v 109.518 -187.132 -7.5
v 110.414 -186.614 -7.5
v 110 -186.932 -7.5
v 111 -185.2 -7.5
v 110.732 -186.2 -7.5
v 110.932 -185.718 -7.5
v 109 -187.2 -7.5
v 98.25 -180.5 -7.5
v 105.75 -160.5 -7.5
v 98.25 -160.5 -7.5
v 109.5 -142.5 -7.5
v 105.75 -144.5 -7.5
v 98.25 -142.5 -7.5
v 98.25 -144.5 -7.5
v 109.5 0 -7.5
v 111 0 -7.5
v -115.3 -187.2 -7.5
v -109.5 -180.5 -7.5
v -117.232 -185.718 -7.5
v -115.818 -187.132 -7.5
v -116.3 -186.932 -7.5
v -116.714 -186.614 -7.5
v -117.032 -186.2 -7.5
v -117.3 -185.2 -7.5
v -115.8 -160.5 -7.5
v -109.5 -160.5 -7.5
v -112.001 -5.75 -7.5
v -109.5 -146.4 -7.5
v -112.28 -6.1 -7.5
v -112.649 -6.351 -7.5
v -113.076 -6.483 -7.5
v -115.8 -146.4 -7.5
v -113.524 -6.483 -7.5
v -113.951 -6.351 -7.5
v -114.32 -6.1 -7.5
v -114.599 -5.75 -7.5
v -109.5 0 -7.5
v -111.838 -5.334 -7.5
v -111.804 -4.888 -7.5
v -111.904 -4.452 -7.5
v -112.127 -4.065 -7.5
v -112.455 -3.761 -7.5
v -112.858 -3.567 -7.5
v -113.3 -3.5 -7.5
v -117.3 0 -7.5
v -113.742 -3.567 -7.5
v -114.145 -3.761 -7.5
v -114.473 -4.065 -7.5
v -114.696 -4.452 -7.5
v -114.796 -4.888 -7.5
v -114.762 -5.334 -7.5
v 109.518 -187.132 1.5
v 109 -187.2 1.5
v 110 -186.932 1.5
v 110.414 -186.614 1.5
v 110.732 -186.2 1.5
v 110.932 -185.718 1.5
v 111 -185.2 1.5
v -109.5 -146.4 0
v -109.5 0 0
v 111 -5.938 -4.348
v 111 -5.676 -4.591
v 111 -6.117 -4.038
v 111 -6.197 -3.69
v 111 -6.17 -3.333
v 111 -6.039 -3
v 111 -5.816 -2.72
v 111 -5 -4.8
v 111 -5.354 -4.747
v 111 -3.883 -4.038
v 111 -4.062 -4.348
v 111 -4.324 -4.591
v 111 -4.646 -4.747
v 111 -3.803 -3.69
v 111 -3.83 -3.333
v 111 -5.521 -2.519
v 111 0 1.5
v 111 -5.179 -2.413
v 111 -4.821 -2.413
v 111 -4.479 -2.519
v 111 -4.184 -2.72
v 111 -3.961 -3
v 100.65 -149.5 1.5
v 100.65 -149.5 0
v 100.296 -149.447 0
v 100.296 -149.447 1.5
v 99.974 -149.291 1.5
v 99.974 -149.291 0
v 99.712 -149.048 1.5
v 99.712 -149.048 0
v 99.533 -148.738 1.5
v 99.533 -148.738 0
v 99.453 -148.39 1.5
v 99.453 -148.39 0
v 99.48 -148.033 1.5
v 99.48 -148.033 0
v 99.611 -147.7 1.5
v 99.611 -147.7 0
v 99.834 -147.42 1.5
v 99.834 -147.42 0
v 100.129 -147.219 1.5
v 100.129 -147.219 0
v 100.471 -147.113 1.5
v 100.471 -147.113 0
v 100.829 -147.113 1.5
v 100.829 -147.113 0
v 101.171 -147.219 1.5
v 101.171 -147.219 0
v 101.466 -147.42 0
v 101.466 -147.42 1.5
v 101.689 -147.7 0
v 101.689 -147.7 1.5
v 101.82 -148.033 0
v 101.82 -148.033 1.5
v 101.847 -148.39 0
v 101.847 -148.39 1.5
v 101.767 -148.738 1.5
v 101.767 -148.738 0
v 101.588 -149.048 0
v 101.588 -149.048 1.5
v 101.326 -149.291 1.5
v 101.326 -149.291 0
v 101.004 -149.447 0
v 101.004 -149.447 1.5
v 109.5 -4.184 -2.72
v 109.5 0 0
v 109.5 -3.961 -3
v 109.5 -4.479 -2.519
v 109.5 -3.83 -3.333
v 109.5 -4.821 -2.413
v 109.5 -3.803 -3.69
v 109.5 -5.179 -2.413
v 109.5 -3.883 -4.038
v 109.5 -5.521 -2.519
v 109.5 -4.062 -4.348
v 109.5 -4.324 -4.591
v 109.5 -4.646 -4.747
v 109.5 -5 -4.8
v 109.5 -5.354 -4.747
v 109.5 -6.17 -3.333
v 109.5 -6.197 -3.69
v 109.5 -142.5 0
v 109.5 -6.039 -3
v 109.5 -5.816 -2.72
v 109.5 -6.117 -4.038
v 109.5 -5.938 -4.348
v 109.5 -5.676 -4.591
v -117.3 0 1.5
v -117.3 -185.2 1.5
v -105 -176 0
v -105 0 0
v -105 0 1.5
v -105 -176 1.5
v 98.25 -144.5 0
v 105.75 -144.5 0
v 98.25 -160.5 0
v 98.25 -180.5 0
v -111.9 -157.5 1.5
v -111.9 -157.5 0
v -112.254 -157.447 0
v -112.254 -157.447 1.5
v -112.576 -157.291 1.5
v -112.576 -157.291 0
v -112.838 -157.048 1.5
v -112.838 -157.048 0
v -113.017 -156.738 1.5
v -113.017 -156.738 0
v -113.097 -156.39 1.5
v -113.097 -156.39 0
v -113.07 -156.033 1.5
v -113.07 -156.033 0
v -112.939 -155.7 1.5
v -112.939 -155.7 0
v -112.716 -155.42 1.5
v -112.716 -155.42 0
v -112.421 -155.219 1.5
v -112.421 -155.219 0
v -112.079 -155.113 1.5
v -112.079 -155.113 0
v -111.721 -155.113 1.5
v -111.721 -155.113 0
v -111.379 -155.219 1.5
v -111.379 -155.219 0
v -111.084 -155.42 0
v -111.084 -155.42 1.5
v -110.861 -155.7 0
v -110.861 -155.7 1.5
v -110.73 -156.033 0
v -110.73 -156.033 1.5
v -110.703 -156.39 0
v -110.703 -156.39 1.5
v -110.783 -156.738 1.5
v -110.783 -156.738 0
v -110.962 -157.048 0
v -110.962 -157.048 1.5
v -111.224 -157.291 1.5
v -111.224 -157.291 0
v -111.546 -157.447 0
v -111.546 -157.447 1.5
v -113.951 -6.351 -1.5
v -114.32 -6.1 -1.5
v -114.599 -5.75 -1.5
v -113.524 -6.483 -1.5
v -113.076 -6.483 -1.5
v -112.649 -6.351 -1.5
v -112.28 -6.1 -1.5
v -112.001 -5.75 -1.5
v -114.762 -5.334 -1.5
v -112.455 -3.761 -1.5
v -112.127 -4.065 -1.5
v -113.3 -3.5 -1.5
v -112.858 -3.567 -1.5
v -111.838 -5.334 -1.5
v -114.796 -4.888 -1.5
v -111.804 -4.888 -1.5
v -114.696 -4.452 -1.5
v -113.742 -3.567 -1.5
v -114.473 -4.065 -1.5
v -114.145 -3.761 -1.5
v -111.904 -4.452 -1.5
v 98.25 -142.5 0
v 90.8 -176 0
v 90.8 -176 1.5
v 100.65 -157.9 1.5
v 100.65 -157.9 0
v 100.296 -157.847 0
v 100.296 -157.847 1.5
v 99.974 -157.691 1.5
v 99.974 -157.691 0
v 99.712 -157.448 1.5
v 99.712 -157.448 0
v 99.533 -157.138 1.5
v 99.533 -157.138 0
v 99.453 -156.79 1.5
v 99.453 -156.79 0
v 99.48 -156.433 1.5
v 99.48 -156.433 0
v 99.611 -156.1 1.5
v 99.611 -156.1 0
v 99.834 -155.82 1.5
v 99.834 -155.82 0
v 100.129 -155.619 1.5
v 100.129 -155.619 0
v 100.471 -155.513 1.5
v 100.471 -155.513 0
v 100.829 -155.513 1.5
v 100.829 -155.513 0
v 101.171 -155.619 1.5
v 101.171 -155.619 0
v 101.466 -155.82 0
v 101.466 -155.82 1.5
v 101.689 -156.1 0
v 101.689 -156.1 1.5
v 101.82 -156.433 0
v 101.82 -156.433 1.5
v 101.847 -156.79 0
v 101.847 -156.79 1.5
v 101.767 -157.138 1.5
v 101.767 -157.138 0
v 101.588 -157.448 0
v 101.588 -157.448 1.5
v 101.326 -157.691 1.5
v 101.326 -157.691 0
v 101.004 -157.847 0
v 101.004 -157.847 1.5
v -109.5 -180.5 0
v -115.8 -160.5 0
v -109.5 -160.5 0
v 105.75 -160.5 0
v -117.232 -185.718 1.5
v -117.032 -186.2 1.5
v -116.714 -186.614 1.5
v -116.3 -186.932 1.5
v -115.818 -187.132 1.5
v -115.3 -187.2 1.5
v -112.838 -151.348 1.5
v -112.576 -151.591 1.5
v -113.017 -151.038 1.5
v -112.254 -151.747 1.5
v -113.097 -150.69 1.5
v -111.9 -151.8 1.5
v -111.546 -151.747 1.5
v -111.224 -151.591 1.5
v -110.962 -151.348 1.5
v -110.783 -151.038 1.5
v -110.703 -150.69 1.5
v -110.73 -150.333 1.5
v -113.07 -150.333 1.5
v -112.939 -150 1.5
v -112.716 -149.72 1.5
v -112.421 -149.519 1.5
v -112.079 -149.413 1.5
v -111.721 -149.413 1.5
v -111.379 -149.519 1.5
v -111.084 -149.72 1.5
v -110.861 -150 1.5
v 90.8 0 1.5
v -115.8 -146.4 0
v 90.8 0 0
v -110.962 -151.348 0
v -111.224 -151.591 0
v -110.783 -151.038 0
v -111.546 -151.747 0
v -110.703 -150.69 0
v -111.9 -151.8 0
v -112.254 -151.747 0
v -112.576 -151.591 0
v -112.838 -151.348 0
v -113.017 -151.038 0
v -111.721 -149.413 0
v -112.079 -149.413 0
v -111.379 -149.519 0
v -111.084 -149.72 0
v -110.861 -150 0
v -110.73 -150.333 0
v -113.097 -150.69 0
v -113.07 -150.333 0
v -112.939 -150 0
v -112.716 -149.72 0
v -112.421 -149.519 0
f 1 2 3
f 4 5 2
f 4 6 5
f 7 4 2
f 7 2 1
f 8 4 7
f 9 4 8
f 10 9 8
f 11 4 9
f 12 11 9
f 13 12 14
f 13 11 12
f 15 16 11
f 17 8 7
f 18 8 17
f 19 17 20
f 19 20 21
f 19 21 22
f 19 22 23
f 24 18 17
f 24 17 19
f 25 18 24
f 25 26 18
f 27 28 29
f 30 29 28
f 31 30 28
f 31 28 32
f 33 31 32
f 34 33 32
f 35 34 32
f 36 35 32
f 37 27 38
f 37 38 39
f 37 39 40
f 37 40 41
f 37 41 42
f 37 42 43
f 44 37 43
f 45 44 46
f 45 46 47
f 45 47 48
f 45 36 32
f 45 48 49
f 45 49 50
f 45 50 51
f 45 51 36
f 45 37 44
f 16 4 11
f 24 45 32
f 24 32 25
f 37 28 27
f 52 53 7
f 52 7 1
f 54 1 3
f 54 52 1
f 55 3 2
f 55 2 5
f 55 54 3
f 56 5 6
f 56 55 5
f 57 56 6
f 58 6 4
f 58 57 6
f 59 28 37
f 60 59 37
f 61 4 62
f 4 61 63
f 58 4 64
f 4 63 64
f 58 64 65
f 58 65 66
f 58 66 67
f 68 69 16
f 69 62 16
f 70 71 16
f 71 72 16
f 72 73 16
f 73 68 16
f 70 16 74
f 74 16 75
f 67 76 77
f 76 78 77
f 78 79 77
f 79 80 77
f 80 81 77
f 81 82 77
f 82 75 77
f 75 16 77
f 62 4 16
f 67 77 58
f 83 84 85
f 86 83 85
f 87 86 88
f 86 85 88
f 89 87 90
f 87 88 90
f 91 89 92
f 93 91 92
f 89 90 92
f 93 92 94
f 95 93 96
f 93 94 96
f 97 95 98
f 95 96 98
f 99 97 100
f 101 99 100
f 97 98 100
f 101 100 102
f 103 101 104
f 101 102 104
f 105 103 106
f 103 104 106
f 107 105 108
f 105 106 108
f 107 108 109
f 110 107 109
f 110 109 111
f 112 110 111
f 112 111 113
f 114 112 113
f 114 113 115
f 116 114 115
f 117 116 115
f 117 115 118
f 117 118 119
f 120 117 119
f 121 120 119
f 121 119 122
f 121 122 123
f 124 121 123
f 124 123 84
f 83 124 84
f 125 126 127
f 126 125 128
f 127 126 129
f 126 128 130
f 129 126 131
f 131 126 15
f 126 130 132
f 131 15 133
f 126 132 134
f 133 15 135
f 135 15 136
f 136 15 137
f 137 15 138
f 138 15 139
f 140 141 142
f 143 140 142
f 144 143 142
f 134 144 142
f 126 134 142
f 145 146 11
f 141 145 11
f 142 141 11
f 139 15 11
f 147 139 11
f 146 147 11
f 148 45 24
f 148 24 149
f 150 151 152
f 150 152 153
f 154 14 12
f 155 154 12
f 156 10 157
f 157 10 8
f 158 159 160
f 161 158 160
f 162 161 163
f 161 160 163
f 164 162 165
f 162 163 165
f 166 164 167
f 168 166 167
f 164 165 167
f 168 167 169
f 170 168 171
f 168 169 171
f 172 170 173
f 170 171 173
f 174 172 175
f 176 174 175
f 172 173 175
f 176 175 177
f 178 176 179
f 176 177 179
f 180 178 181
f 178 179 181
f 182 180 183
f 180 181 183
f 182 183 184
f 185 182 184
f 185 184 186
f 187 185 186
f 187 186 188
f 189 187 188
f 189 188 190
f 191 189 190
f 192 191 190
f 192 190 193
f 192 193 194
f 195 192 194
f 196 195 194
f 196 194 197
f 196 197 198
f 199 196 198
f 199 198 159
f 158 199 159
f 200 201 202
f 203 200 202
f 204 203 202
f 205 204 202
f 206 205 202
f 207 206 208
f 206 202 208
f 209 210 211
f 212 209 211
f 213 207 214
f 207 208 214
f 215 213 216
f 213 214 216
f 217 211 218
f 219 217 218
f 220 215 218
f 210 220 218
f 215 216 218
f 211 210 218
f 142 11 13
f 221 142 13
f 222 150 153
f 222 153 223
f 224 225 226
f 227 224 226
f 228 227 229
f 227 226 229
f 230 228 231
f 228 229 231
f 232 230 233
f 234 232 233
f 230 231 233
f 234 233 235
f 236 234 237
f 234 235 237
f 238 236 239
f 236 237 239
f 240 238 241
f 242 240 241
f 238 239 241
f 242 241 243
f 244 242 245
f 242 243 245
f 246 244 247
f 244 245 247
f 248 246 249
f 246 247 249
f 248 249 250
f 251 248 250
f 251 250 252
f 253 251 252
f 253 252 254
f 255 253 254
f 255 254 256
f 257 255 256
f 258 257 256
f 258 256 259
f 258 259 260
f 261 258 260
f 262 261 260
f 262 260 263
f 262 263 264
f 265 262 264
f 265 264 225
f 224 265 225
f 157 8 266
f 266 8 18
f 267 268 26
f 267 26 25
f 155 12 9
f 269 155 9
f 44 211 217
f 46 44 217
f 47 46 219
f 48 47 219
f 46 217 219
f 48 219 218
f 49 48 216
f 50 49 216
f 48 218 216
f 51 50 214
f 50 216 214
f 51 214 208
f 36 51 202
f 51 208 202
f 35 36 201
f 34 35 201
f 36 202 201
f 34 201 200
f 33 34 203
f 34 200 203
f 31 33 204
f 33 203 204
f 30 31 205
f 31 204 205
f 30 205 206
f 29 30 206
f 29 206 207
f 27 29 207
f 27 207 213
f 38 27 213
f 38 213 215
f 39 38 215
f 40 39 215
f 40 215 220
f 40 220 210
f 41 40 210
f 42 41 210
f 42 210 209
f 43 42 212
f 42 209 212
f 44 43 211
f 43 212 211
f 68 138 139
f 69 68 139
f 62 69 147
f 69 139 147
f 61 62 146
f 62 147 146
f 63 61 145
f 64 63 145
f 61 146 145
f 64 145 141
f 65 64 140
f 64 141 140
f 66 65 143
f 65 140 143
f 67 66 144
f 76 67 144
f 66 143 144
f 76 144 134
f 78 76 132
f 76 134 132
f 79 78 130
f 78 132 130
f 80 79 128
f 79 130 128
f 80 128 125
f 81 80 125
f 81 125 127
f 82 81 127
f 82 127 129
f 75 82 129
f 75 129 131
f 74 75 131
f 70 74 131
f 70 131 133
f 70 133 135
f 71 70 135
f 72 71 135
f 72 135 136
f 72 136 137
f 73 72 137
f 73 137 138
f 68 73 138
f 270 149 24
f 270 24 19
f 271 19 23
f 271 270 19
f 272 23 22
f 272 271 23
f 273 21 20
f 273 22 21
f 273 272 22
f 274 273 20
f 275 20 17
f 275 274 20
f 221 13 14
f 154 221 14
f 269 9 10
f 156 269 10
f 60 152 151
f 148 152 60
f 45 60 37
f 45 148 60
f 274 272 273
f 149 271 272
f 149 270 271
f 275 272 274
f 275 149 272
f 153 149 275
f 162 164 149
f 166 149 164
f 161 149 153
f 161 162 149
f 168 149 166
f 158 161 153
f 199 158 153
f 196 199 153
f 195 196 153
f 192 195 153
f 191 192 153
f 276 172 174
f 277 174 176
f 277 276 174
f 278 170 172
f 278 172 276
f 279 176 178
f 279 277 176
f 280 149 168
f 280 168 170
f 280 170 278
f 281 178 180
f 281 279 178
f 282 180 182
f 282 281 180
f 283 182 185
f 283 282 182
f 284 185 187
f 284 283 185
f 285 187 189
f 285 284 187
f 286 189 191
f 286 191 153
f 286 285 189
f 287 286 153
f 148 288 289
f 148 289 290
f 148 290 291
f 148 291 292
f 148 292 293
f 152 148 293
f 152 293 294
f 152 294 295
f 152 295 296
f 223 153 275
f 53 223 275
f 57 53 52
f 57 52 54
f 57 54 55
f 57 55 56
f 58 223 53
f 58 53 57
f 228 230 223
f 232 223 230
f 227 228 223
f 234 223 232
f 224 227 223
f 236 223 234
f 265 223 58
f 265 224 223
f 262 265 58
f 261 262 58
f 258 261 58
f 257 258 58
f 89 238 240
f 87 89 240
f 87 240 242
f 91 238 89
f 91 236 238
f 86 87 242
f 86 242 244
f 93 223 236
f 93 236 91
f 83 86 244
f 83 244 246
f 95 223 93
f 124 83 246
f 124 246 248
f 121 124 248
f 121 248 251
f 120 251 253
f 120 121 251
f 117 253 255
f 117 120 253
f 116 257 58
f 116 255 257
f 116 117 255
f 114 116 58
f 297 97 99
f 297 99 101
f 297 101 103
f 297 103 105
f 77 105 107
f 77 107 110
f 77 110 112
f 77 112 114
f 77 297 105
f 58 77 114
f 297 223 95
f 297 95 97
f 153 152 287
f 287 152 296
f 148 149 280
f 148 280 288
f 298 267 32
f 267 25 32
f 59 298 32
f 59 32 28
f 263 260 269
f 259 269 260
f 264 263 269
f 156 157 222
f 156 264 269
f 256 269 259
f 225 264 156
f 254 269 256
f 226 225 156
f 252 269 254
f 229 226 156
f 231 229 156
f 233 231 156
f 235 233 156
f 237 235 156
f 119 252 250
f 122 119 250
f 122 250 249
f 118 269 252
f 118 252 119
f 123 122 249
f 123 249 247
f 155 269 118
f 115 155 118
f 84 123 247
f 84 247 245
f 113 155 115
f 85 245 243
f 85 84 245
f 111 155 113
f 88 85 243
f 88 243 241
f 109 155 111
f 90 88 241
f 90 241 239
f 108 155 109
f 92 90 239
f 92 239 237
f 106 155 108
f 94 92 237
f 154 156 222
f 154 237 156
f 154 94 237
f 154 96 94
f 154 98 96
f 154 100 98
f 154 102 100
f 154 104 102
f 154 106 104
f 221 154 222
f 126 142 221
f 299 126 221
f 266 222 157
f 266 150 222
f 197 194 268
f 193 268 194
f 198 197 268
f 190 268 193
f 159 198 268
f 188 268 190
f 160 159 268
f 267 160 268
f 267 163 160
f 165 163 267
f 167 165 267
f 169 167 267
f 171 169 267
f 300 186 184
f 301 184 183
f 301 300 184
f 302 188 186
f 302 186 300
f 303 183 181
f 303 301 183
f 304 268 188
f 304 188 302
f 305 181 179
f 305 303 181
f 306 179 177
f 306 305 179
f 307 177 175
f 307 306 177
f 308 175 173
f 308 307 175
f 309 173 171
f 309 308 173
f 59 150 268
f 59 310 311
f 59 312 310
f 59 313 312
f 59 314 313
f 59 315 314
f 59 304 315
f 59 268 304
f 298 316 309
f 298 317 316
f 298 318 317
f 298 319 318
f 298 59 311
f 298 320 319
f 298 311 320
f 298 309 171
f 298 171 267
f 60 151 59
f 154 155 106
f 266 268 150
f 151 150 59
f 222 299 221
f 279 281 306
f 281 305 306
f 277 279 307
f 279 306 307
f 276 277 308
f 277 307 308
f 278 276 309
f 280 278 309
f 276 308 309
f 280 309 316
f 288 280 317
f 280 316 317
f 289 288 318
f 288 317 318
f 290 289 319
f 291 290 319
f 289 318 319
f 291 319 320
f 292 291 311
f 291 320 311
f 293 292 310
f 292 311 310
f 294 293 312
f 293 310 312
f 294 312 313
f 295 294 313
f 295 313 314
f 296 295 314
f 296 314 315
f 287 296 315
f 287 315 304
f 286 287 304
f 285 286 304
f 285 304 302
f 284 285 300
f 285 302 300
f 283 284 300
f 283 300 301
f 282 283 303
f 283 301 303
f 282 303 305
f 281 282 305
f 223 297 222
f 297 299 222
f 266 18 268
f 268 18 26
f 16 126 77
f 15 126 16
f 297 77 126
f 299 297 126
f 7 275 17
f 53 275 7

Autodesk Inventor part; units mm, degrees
ref_plane "YZ Plane" through (0, 0, 0) normal (1, 0, 0) x (0, 1, 0)
ref_plane "XZ Plane" through (0, 0, 0) normal (0, 1, 0) x (-1, 0, 0)
ref_plane "XY Plane" through (0, 0, 0) normal (0, 0, 1) x (1, 0, 0)
sketch "Boceto1" plane through (0, 0, 0) normal (0, 0, 1) x (1, 0, 0)
  circle A0 centre (100.65, -156.7) radius 1.65 projected
  circle A1 centre (100.65, -148.3) radius 1.65 projected
  circle A2 centre (100.65, 156.7) radius 1.65 projected
  circle A3 centre (100.65, 148.3) radius 1.65 projected
  line L0 (97.75, 145) -> (105.25, 145) projected
  line L1 (105.25, 145) -> (105.25, 160) projected
  line L2 (105.25, 160) -> (97.75, 160) projected
  line L3 (97.75, 160) -> (97.75, 180) projected
  line L4 (97.75, 180) -> (-109, 180) projected
  line L5 (-109, 160) -> (-115.3, 160) projected
  line L6 (-109, -160) -> (-109, -180) projected
  line L7 (-115.3, 146.9) -> (-109, 146.9) projected
  line L8 (-109, -146.9) -> (-115.3, -146.9) projected
  line L9 (-109, 180) -> (-109, 160) projected
  line L10 (-115.3, -160) -> (-109, -160) projected
  line L11 (-109, -180) -> (97.75, -180) projected
  line L12 (97.75, -180) -> (97.75, -160) projected
  line L13 (97.75, -160) -> (105.25, -160) projected
  line L14 (105.25, -160) -> (105.25, -145) projected
  line L15 (105.25, -145) -> (97.75, -145) projected
  line L16 (97.75, -145) -> (97.75, -142) projected
  line L17 (97.75, -142) -> (109, -142) projected
  line L18 (109, -142) -> (109, 142) projected
  line L19 (109, 142) -> (97.75, 142) projected
  line L20 (97.75, 142) -> (97.75, 145) projected
  line L21 (109, 180) -> (97.75, 180)
  line L22 (-109, -160) -> (-109, -180)
  line L23 (-109, -180) -> (-102.7, -180)
  line L24 (-109, -180) -> (109, -180)
  line L25 (109, -180) -> (109, 180)
  line L26 (109, 180) -> (-109, 180)
  line L27 (111, 142) -> (111, 180)
  line L28 (109, 182) -> (97.75, 182)
  line L29 (-109, -182) -> (-102.7, -182)
  line L30 (-111, -182) -> (111, -182)
  line L31 (111, -182) -> (111, 182)
  line L32 (111, 182) -> (-111, 182)
  circle A4 centre (-111.9, -156.3) radius 1.2 projected
  circle A5 centre (-111.9, -150.6) radius 1.2 projected
  circle A6 centre (-111.9, 156.3) radius 1.2 projected
  circle A7 centre (-111.9, 150.6) radius 1.2 projected
  line L33 (-115.3, 160) -> (-115.3, 146.9) projected
  line L34 (-109, 146.9) -> (-109, -146.9) projected
  line L35 (-115.3, -146.9) -> (-115.3, -160) projected
  line L36 (-109, 180) -> (-115.3, 180)
  line L37 (-109, -180) -> (-115.3, -180)
  line L38 (-115.3, 180) -> (109, 180)
  line L39 (109, 180) -> (109, -180)
  line L40 (109, -180) -> (-115.3, -180)
  line L41 (-115.3, -180) -> (-115.3, 180)
  line L42 (-117.3, 180) -> (-117.3, -182)
  line L43 (-117.3, -182) -> (109, -182)
  line L44 (-115.3, 182) -> (111, 182)
  line L45 (111, 182) -> (111, -180)
  line L46 (-117.3, 180) -> (-117.3, 182)
  line L47 (-117.3, 182) -> (-115.3, 182)
  point P0 (0, 0)
  dimension "d1" = 2
  dimension "d3" = 2
  dimension "d20" = 2
  dimension "d21" = 2
extrude "Extrusión1" add sketch "Boceto1" against normal blind 7.5 contours L0 L1 L2 L3 L21 L25 L19 L20 | L25 L24 L12 L13 L14 L15 L16 L17 | L9 L5 L41 L36 | L37 L41 L10 L6 | L7 L34 L8 L41 | L31 L30 L29 L43 L42 L46 L47 L44 L32 L28 L27
sketch "Boceto2" plane through (0, 0, 0) normal (0, 0, 1) x (1, 0, 0)
  line L0 (-117.3, -182) -> (111, -182) projected
  line L1 (111, -182) -> (111, 182) projected
  line L2 (111, 182) -> (-117.3, 182) projected
  line L3 (90.8, 170.8) -> (90.8, -176) projected
  line L4 (90.8, 170.8) -> (90.8, -176) projected
  line L5 (-19.4789, -176) -> (90.8, -176) projected
  line L6 (90.8, -176) -> (-99.7, -176) projected
  line L7 (-99.7, -176) -> (-99.7, 170.8) projected
  line L8 (-99.7, 170.8) -> (90.8, 170.8) projected
  line L9 (-117.3, 182) -> (-117.3, -182) projected
  line L10 (-105.5008, -176) -> (-99.7, -176)
  line L11 (-99.7, 170.8) -> (-105.5008, 170.8)
  line L12 (-109, 160) -> (-109, 180) projected
  line L13 (-109, 170.8) -> (-105, 170.8)
  line L14 (-105, 170.8) -> (-105, -176)
  point P0 (0, 0)
  dimension "d33" = 4
extrude "Extrusión2" add sketch "Boceto2" along normal blind 1.5
sketch "Boceto3" plane through (-111, -182, -7.5) normal (0, -1, 0) x (1, 0, 0)
  line L0 (222, 0) -> (-6.3, 0) projected
  line L1 (222, 0) -> (222, 9) projected
  line L2 (-6.3, 9) -> (222, 9) projected
  line L3 (-6.3, 0) -> (-6.3, 9) projected
  point P0 (111, 7.5)
extrude "Extrusión3" add sketch "Boceto3" along normal blind 5.2
sketch "Boceto5" plane through (0, 0, 1.5) normal (0, 0, 1) x (1, 0, 0)
  circle A0 centre (100.65, -156.7) radius 1.65 projected
  circle A1 centre (100.65, -148.3) radius 1.65 projected
  circle A2 centre (100.65, 156.7) radius 1.65 projected
  circle A3 centre (100.65, 148.3) radius 1.65 projected
  line L0 (97.75, 145) -> (105.25, 145) projected
  line L1 (105.25, 145) -> (105.25, 160) projected
  line L2 (105.25, 160) -> (97.75, 160) projected
  line L3 (97.75, 160) -> (97.75, 180) projected
  line L4 (97.75, 180) -> (-109, 180) projected
  line L5 (-109, 160) -> (-115.3, 160) projected
  line L6 (-109, -160) -> (-109, -180) projected
  line L7 (-115.3, 146.9) -> (-109, 146.9) projected
  line L8 (-109, -146.9) -> (-115.3, -146.9) projected
  line L9 (-109, 180) -> (-109, 160) projected
  line L10 (-115.3, -160) -> (-109, -160) projected
  line L11 (-109, -180) -> (97.75, -180) projected
  line L12 (97.75, -180) -> (97.75, -160) projected
  line L13 (97.75, -160) -> (105.25, -160) projected
  line L14 (105.25, -160) -> (105.25, -145) projected
  line L15 (105.25, -145) -> (97.75, -145) projected
  line L16 (97.75, -145) -> (97.75, -142) projected
  line L17 (97.75, -142) -> (109, -142) projected
  line L18 (109, -142) -> (109, 142) projected
  line L19 (109, 142) -> (97.75, 142) projected
  line L20 (97.75, 142) -> (97.75, 145) projected
  circle A4 centre (-111.9, -156.3) radius 1.2 projected
  circle A5 centre (-111.9, -150.6) radius 1.2 projected
  circle A6 centre (-111.9, 156.3) radius 1.2 projected
  circle A7 centre (-111.9, 150.6) radius 1.2 projected
  line L21 (-115.3, 160) -> (-115.3, 146.9) projected
  line L22 (-109, 146.9) -> (-109, -146.9) projected
  line L23 (-115.3, -146.9) -> (-115.3, -160) projected
  point P0 (0, 0)
hole "Agujero1" at (100.65, 148.3, 1.5) at (100.65, 156.7, 1.5) at (100.65, -156.7, 1.5) at (100.65, -148.3, 1.5) at (-111.9, -156.3, 1.5) at (-111.9, -150.6, 1.5) at (-111.9, 150.6, 1.5) at (-111.9, 156.3, 1.5) direction (0, 0, -1) diameter 2.4 end through all
sketch "Boceto6" plane through (0, 0, -7.5) normal (0, 0, -1) x (-1, 0, 0)
  line L0 (117.3, 182) -> (-111, 182) projected
  line L1 (-111, 182) -> (-111, -187.2) projected
  line L2 (117.3, -187.2) -> (-111, -187.2) projected
  line L3 (117.3, 182) -> (117.3, -187.2) projected
  line L4 (-97.75, 160) -> (-97.75, 180) projected
  line L5 (-97.75, 180) -> (109, 180) projected
  line L6 (109, 180) -> (109, 160) projected
  line L7 (109, 160) -> (115.3, 160) projected
  line L8 (115.3, 160) -> (115.3, 146.9) projected
  line L9 (115.3, 146.9) -> (109, 146.9) projected
  line L10 (109, 146.9) -> (109, -146.9) projected
  line L11 (109, -146.9) -> (115.3, -146.9) projected
  line L12 (115.3, -146.9) -> (115.3, -160) projected
  line L13 (115.3, -160) -> (109, -160) projected
  line L14 (109, -160) -> (109, -180) projected
  line L15 (109, -180) -> (-97.75, -180) projected
  line L16 (-97.75, -180) -> (-97.75, -160) projected
  line L17 (-97.75, -160) -> (-105.25, -160) projected
  line L18 (-105.25, -160) -> (-105.25, -145) projected
  line L19 (-105.25, -145) -> (-97.75, -145) projected
  line L20 (-97.75, -145) -> (-97.75, -142) projected
  line L21 (-97.75, -142) -> (-109, -142) projected
  line L22 (-109, -142) -> (-109, 142) projected
  line L23 (-109, 142) -> (-97.75, 142) projected
  line L24 (-97.75, 142) -> (-97.75, 145) projected
  line L25 (-97.75, 145) -> (-105.25, 145) projected
  line L26 (-105.25, 145) -> (-105.25, 160) projected
  line L27 (-105.25, 160) -> (-97.75, 160) projected
  line L28 (117.3, 182) -> (117.3, -187.2) projected
  line L29 (117.3, 182) -> (-111, 182) projected
  line L30 (-111, 182) -> (-111, -187.2) projected
  line L31 (117.3, -187.2) -> (-111, -187.2) projected
  line L32 (109.5, 160.5) -> (109.5, 180.5)
  line L33 (109.5, 180.5) -> (-98.25, 180.5)
  line L34 (-98.25, 180.5) -> (-98.25, 160.5)
  line L35 (-98.25, 160.5) -> (-105.75, 160.5)
  line L36 (-105.75, 160.5) -> (-105.75, 144.5)
  line L37 (-105.75, 144.5) -> (-98.25, 144.5)
  line L38 (-98.25, 144.5) -> (-98.25, 142.5)
  line L39 (-98.25, 142.5) -> (-109.5, 142.5)
  line L40 (-109.5, 142.5) -> (-109.5, -142.5)
  line L41 (-109.5, -142.5) -> (-98.25, -142.5)
  line L42 (-98.25, -142.5) -> (-98.25, -144.5)
  line L43 (-98.25, -144.5) -> (-105.75, -144.5)
  line L44 (-105.75, -144.5) -> (-105.75, -160.5)
  line L45 (-105.75, -160.5) -> (-98.25, -160.5)
  line L46 (-98.25, -160.5) -> (-98.25, -180.5)
  line L47 (-98.25, -180.5) -> (109.5, -180.5)
  line L48 (109.5, -180.5) -> (109.5, -160.5)
  line L49 (109.5, -160.5) -> (115.8, -160.5)
  line L50 (115.8, -160.5) -> (115.8, -146.4)
  line L51 (115.8, -146.4) -> (109.5, -146.4)
  line L52 (109.5, -146.4) -> (109.5, 146.4)
  line L53 (109.5, 146.4) -> (115.8, 146.4)
  line L54 (115.8, 146.4) -> (115.8, 160.5)
  line L55 (115.8, 160.5) -> (109.5, 160.5)
  dimension "d22" = 0.5
extrude "Extrusión4" cut sketch "Boceto6" against normal blind 7.5 contours L55 L54 L53 L52 L51 L50 L49 L48 L47 L46 L45 L44 L43 L42 L41 L40 L39 L38 L37 L36 L35 L34 L33 L32
fillet "Empalme1" radius 2 5 edges at (-117.3, 182, 0.75) (-117.3, 182, -3.75) (111, 182, -3) (111, -187.2, -3) (-117.3, -187.2, -3)
sketch "Boceto7" plane through (0, 0, -7.5) normal (0, 0, -1) x (-1, 0, 0)
  arc A0 (117.3, 7) -> (114.3, 10) centre (114.3, 7) ccw projected
  line L0 (114.3, 10) -> (100.3, 10) projected
  arc A1 (100.3, 10) -> (97.3, 7) centre (100.3, 7) ccw projected
  line L1 (97.3, 7) -> (97.3, -7) projected
  arc A2 (97.3, -7) -> (100.3, -10) centre (100.3, -7) ccw projected
  line L2 (100.3, -10) -> (114.3, -10) projected
  arc A3 (114.3, -10) -> (117.3, -7) centre (114.3, -7) ccw projected
  line L3 (117.3, -7) -> (117.3, 7) projected
  circle A4 centre (103.3, -5) radius 1 projected
  circle A5 centre (113.3, 5) radius 1 projected
  circle A6 centre (103.3, 5) radius 1 projected
  circle A7 centre (113.3, -5) radius 1 projected
  circle A8 centre (113.3, 5) radius 1 projected
  point P0 (0, 0)
hole "Agujero2" at (-113.3, 5, -7.5) at (-113.3, -5, -7.5) direction (0, 0, 1) diameter 3 depth 6
split "Dividir4" plane through (0, 0, 0) removes the side toward (0, 1, 0)
sketch "Boceto8" plane through (111, -185.2, 1.5) normal (1, 0, 0) x (0, 0, -1)
  circle A0 centre (12.7426, 180.2) radius 1.2 projected
  line L0 (9, 185.2) -> (0, 185.2) projected
  line L1 (9, 185.2) -> (9, 0) projected
  circle A1 centre (5.1, 190.2) radius 1.2 projected
  line L2 (0, 185.2) -> (9, 185.2) projected
  line L3 (9, 365.2) -> (9, 185.2) projected
  line L4 (0, 365.2) -> (9, 365.2) projected
  line L5 (0, 365.2) -> (0, 185.2) projected
  line L6 (5.1, 190.2) -> (5.1, 180.2)
  point P0 (1.5, 185.2)
hole "Agujero3" at (111, -5, -3.6) direction (-1, 0, 0) diameter 2.4 depth 8 tip angle 118
properties part number "MarcoIzquierdo"
